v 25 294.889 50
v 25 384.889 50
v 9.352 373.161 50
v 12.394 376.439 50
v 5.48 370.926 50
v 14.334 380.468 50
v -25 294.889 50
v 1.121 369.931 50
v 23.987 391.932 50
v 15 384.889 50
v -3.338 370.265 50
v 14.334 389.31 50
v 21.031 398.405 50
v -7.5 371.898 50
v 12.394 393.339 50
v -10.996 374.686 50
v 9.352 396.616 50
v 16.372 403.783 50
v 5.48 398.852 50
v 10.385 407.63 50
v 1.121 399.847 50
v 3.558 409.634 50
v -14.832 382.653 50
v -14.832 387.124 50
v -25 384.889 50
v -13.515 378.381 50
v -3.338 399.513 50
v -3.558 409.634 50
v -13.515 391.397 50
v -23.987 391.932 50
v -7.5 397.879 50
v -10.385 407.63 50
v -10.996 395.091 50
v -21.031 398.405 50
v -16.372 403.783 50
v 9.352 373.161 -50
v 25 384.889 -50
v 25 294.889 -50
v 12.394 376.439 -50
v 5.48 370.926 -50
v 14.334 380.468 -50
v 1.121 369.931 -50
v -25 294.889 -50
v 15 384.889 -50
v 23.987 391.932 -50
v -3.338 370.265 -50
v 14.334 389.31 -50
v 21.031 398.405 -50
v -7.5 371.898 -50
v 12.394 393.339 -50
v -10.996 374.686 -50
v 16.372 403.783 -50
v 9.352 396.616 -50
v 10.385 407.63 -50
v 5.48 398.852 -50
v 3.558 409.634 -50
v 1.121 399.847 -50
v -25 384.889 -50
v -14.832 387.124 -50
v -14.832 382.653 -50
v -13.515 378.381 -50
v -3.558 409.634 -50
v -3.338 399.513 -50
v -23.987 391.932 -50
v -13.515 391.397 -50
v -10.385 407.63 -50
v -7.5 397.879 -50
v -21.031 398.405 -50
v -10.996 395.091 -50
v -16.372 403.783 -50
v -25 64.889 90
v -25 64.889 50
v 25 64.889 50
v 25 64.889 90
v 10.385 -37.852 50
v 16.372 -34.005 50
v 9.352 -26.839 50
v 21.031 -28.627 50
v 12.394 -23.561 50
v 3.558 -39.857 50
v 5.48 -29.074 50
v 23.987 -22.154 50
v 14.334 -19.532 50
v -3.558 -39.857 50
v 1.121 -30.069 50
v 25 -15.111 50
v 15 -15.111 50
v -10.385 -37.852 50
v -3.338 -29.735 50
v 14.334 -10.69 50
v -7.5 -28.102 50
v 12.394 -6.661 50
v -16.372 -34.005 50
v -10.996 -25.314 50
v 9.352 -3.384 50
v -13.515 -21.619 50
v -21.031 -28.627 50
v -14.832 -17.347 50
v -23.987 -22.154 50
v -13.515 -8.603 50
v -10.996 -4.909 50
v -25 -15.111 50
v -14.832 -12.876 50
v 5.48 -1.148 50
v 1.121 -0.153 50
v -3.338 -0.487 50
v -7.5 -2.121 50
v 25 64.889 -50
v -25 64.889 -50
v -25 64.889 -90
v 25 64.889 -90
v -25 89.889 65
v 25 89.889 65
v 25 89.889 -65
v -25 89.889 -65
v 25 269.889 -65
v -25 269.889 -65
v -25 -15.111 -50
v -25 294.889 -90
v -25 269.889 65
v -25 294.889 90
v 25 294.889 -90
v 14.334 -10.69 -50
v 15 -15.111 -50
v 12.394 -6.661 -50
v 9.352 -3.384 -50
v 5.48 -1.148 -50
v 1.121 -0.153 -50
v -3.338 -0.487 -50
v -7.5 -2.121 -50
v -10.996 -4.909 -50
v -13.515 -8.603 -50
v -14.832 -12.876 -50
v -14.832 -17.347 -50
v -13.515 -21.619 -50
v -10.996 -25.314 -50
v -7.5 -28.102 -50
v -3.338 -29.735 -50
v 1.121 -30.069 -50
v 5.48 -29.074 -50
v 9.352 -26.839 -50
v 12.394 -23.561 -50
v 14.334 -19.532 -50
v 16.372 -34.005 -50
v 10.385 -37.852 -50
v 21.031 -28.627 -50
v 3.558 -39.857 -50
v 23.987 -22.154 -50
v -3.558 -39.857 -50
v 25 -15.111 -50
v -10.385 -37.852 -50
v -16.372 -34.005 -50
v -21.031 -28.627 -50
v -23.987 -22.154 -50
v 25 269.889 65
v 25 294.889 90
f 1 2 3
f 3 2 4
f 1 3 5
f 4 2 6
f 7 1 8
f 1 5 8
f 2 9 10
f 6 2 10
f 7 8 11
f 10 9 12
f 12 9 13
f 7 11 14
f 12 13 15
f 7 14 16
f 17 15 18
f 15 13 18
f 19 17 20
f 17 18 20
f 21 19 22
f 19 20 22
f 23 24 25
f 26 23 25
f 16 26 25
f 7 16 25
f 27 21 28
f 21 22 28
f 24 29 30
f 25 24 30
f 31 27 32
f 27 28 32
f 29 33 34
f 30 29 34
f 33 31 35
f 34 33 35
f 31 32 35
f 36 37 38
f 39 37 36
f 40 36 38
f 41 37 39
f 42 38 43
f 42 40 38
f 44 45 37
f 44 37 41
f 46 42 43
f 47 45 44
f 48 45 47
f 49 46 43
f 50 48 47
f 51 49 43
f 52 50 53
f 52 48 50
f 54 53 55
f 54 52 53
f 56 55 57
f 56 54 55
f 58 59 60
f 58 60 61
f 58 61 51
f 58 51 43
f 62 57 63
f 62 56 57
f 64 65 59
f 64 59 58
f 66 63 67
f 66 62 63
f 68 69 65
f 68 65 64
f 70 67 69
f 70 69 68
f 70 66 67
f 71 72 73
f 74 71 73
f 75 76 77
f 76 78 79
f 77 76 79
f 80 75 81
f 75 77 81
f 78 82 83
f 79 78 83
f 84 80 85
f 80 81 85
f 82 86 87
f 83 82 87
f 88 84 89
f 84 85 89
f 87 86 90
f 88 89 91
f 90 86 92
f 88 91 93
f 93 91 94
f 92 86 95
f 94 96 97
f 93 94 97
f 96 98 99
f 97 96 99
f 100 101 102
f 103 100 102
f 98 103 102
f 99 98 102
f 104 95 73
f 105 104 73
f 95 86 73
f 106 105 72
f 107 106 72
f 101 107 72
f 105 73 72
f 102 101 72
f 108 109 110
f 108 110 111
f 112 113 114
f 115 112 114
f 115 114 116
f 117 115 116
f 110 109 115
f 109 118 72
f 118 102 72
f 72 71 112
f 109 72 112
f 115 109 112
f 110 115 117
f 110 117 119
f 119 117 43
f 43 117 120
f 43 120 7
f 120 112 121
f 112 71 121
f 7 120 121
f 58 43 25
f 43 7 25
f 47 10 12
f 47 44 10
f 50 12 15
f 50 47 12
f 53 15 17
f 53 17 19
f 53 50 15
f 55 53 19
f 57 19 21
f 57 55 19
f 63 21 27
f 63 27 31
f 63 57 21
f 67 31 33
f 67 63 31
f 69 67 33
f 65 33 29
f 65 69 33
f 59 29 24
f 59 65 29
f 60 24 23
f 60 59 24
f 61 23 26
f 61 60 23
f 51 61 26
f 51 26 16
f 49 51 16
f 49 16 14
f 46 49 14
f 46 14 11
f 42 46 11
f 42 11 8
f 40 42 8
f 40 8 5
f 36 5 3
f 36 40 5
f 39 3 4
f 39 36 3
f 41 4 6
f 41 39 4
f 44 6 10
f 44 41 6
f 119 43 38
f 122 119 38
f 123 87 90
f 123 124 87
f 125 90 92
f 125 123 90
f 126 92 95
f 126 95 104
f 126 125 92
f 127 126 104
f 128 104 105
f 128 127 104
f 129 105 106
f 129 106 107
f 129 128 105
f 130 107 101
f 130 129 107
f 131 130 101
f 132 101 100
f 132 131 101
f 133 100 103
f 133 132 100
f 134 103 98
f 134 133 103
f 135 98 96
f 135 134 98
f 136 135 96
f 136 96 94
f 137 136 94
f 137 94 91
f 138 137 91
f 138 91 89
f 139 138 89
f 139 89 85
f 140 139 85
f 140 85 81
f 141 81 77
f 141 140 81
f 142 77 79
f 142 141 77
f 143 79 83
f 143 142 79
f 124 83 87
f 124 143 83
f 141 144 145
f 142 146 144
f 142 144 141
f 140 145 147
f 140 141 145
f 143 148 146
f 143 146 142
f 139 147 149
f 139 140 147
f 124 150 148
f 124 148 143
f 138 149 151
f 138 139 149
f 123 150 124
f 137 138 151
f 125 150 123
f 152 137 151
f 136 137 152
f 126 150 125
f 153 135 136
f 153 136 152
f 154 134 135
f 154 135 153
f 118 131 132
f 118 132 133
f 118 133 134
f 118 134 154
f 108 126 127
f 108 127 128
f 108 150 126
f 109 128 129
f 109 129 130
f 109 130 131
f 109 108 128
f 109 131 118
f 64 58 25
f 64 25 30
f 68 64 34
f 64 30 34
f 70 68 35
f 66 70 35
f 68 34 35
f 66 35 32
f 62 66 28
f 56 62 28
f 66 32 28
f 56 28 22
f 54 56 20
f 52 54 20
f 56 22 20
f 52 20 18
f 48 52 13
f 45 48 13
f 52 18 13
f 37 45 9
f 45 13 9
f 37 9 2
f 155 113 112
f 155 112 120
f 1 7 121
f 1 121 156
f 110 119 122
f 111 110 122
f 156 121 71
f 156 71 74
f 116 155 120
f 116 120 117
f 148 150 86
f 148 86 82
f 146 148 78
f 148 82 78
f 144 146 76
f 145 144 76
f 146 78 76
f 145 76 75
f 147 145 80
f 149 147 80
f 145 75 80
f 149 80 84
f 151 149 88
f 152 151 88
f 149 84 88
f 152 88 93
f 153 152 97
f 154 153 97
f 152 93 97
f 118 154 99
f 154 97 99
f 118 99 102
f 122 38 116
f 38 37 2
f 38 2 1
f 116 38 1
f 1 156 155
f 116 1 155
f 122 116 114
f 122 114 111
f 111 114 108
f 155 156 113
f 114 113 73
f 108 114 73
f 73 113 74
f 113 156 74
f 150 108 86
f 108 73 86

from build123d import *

# Parameters (mm, degrees)
SCHIZZO1_R                   = 15
ESTRUSIONE_ESTRUSIONE1_DEPTH = 50
SCHIZZO2_W                   = 50
SCHIZZO2_H                   = 230
ESTRUSIONE_ESTRUSIONE2_DEPTH = 40
SCHIZZO3_W                   = 130
SCHIZZO3_H                   = 180
TAGLIO_ESTRUSIONE1_DEPTH     = 423.621427401


with BuildPart() as part:
    # Schizzo1 → Estrusione-Estrusione1 (new, symmetric)
    with BuildSketch(Plane.XY):
        with BuildLine():
            Line((25, 384.888851883), (25, -15.111148117))
            ThreePointArc((25, -15.111148117), (0, -40.111148117), (-25, -15.111148117))
            Line((-25, -15.111148117), (-25, 384.888851883))
            ThreePointArc((-25, 384.888851883), (0, 409.888851883), (25, 384.888851883))
        make_face()
        with Locations((0, 384.888851883)):
            Circle(SCHIZZO1_R, mode=Mode.SUBTRACT)
        with Locations((0, -15.111148117)):
            Circle(SCHIZZO1_R, mode=Mode.SUBTRACT)
    extrude(amount=ESTRUSIONE_ESTRUSIONE1_DEPTH, both=True)

    # Schizzo2 → Estrusione-Estrusione2 (add)
    with BuildSketch(Plane.XY.offset(50)):
        with Locations((0, 179.888851883)):
            Rectangle(SCHIZZO2_W, SCHIZZO2_H)
    estrusione_estrusione2 = extrude(amount=ESTRUSIONE_ESTRUSIONE2_DEPTH)

    # Specchia1: Estrusione-Estrusione2 across plane
    add(estrusione_estrusione2.mirror(Plane.XY))

    # Schizzo3 → Taglio-Estrusione1 (cut, through all)
    with BuildSketch(Plane(origin=(25, 0, 0), x_dir=(0, 0, -1), z_dir=(1, 0, 0))):
        with Locations((0, 179.888851883)):
            Rectangle(SCHIZZO3_W, SCHIZZO3_H)
    extrude(amount=-TAGLIO_ESTRUSIONE1_DEPTH, mode=Mode.SUBTRACT)


solid = part.part
